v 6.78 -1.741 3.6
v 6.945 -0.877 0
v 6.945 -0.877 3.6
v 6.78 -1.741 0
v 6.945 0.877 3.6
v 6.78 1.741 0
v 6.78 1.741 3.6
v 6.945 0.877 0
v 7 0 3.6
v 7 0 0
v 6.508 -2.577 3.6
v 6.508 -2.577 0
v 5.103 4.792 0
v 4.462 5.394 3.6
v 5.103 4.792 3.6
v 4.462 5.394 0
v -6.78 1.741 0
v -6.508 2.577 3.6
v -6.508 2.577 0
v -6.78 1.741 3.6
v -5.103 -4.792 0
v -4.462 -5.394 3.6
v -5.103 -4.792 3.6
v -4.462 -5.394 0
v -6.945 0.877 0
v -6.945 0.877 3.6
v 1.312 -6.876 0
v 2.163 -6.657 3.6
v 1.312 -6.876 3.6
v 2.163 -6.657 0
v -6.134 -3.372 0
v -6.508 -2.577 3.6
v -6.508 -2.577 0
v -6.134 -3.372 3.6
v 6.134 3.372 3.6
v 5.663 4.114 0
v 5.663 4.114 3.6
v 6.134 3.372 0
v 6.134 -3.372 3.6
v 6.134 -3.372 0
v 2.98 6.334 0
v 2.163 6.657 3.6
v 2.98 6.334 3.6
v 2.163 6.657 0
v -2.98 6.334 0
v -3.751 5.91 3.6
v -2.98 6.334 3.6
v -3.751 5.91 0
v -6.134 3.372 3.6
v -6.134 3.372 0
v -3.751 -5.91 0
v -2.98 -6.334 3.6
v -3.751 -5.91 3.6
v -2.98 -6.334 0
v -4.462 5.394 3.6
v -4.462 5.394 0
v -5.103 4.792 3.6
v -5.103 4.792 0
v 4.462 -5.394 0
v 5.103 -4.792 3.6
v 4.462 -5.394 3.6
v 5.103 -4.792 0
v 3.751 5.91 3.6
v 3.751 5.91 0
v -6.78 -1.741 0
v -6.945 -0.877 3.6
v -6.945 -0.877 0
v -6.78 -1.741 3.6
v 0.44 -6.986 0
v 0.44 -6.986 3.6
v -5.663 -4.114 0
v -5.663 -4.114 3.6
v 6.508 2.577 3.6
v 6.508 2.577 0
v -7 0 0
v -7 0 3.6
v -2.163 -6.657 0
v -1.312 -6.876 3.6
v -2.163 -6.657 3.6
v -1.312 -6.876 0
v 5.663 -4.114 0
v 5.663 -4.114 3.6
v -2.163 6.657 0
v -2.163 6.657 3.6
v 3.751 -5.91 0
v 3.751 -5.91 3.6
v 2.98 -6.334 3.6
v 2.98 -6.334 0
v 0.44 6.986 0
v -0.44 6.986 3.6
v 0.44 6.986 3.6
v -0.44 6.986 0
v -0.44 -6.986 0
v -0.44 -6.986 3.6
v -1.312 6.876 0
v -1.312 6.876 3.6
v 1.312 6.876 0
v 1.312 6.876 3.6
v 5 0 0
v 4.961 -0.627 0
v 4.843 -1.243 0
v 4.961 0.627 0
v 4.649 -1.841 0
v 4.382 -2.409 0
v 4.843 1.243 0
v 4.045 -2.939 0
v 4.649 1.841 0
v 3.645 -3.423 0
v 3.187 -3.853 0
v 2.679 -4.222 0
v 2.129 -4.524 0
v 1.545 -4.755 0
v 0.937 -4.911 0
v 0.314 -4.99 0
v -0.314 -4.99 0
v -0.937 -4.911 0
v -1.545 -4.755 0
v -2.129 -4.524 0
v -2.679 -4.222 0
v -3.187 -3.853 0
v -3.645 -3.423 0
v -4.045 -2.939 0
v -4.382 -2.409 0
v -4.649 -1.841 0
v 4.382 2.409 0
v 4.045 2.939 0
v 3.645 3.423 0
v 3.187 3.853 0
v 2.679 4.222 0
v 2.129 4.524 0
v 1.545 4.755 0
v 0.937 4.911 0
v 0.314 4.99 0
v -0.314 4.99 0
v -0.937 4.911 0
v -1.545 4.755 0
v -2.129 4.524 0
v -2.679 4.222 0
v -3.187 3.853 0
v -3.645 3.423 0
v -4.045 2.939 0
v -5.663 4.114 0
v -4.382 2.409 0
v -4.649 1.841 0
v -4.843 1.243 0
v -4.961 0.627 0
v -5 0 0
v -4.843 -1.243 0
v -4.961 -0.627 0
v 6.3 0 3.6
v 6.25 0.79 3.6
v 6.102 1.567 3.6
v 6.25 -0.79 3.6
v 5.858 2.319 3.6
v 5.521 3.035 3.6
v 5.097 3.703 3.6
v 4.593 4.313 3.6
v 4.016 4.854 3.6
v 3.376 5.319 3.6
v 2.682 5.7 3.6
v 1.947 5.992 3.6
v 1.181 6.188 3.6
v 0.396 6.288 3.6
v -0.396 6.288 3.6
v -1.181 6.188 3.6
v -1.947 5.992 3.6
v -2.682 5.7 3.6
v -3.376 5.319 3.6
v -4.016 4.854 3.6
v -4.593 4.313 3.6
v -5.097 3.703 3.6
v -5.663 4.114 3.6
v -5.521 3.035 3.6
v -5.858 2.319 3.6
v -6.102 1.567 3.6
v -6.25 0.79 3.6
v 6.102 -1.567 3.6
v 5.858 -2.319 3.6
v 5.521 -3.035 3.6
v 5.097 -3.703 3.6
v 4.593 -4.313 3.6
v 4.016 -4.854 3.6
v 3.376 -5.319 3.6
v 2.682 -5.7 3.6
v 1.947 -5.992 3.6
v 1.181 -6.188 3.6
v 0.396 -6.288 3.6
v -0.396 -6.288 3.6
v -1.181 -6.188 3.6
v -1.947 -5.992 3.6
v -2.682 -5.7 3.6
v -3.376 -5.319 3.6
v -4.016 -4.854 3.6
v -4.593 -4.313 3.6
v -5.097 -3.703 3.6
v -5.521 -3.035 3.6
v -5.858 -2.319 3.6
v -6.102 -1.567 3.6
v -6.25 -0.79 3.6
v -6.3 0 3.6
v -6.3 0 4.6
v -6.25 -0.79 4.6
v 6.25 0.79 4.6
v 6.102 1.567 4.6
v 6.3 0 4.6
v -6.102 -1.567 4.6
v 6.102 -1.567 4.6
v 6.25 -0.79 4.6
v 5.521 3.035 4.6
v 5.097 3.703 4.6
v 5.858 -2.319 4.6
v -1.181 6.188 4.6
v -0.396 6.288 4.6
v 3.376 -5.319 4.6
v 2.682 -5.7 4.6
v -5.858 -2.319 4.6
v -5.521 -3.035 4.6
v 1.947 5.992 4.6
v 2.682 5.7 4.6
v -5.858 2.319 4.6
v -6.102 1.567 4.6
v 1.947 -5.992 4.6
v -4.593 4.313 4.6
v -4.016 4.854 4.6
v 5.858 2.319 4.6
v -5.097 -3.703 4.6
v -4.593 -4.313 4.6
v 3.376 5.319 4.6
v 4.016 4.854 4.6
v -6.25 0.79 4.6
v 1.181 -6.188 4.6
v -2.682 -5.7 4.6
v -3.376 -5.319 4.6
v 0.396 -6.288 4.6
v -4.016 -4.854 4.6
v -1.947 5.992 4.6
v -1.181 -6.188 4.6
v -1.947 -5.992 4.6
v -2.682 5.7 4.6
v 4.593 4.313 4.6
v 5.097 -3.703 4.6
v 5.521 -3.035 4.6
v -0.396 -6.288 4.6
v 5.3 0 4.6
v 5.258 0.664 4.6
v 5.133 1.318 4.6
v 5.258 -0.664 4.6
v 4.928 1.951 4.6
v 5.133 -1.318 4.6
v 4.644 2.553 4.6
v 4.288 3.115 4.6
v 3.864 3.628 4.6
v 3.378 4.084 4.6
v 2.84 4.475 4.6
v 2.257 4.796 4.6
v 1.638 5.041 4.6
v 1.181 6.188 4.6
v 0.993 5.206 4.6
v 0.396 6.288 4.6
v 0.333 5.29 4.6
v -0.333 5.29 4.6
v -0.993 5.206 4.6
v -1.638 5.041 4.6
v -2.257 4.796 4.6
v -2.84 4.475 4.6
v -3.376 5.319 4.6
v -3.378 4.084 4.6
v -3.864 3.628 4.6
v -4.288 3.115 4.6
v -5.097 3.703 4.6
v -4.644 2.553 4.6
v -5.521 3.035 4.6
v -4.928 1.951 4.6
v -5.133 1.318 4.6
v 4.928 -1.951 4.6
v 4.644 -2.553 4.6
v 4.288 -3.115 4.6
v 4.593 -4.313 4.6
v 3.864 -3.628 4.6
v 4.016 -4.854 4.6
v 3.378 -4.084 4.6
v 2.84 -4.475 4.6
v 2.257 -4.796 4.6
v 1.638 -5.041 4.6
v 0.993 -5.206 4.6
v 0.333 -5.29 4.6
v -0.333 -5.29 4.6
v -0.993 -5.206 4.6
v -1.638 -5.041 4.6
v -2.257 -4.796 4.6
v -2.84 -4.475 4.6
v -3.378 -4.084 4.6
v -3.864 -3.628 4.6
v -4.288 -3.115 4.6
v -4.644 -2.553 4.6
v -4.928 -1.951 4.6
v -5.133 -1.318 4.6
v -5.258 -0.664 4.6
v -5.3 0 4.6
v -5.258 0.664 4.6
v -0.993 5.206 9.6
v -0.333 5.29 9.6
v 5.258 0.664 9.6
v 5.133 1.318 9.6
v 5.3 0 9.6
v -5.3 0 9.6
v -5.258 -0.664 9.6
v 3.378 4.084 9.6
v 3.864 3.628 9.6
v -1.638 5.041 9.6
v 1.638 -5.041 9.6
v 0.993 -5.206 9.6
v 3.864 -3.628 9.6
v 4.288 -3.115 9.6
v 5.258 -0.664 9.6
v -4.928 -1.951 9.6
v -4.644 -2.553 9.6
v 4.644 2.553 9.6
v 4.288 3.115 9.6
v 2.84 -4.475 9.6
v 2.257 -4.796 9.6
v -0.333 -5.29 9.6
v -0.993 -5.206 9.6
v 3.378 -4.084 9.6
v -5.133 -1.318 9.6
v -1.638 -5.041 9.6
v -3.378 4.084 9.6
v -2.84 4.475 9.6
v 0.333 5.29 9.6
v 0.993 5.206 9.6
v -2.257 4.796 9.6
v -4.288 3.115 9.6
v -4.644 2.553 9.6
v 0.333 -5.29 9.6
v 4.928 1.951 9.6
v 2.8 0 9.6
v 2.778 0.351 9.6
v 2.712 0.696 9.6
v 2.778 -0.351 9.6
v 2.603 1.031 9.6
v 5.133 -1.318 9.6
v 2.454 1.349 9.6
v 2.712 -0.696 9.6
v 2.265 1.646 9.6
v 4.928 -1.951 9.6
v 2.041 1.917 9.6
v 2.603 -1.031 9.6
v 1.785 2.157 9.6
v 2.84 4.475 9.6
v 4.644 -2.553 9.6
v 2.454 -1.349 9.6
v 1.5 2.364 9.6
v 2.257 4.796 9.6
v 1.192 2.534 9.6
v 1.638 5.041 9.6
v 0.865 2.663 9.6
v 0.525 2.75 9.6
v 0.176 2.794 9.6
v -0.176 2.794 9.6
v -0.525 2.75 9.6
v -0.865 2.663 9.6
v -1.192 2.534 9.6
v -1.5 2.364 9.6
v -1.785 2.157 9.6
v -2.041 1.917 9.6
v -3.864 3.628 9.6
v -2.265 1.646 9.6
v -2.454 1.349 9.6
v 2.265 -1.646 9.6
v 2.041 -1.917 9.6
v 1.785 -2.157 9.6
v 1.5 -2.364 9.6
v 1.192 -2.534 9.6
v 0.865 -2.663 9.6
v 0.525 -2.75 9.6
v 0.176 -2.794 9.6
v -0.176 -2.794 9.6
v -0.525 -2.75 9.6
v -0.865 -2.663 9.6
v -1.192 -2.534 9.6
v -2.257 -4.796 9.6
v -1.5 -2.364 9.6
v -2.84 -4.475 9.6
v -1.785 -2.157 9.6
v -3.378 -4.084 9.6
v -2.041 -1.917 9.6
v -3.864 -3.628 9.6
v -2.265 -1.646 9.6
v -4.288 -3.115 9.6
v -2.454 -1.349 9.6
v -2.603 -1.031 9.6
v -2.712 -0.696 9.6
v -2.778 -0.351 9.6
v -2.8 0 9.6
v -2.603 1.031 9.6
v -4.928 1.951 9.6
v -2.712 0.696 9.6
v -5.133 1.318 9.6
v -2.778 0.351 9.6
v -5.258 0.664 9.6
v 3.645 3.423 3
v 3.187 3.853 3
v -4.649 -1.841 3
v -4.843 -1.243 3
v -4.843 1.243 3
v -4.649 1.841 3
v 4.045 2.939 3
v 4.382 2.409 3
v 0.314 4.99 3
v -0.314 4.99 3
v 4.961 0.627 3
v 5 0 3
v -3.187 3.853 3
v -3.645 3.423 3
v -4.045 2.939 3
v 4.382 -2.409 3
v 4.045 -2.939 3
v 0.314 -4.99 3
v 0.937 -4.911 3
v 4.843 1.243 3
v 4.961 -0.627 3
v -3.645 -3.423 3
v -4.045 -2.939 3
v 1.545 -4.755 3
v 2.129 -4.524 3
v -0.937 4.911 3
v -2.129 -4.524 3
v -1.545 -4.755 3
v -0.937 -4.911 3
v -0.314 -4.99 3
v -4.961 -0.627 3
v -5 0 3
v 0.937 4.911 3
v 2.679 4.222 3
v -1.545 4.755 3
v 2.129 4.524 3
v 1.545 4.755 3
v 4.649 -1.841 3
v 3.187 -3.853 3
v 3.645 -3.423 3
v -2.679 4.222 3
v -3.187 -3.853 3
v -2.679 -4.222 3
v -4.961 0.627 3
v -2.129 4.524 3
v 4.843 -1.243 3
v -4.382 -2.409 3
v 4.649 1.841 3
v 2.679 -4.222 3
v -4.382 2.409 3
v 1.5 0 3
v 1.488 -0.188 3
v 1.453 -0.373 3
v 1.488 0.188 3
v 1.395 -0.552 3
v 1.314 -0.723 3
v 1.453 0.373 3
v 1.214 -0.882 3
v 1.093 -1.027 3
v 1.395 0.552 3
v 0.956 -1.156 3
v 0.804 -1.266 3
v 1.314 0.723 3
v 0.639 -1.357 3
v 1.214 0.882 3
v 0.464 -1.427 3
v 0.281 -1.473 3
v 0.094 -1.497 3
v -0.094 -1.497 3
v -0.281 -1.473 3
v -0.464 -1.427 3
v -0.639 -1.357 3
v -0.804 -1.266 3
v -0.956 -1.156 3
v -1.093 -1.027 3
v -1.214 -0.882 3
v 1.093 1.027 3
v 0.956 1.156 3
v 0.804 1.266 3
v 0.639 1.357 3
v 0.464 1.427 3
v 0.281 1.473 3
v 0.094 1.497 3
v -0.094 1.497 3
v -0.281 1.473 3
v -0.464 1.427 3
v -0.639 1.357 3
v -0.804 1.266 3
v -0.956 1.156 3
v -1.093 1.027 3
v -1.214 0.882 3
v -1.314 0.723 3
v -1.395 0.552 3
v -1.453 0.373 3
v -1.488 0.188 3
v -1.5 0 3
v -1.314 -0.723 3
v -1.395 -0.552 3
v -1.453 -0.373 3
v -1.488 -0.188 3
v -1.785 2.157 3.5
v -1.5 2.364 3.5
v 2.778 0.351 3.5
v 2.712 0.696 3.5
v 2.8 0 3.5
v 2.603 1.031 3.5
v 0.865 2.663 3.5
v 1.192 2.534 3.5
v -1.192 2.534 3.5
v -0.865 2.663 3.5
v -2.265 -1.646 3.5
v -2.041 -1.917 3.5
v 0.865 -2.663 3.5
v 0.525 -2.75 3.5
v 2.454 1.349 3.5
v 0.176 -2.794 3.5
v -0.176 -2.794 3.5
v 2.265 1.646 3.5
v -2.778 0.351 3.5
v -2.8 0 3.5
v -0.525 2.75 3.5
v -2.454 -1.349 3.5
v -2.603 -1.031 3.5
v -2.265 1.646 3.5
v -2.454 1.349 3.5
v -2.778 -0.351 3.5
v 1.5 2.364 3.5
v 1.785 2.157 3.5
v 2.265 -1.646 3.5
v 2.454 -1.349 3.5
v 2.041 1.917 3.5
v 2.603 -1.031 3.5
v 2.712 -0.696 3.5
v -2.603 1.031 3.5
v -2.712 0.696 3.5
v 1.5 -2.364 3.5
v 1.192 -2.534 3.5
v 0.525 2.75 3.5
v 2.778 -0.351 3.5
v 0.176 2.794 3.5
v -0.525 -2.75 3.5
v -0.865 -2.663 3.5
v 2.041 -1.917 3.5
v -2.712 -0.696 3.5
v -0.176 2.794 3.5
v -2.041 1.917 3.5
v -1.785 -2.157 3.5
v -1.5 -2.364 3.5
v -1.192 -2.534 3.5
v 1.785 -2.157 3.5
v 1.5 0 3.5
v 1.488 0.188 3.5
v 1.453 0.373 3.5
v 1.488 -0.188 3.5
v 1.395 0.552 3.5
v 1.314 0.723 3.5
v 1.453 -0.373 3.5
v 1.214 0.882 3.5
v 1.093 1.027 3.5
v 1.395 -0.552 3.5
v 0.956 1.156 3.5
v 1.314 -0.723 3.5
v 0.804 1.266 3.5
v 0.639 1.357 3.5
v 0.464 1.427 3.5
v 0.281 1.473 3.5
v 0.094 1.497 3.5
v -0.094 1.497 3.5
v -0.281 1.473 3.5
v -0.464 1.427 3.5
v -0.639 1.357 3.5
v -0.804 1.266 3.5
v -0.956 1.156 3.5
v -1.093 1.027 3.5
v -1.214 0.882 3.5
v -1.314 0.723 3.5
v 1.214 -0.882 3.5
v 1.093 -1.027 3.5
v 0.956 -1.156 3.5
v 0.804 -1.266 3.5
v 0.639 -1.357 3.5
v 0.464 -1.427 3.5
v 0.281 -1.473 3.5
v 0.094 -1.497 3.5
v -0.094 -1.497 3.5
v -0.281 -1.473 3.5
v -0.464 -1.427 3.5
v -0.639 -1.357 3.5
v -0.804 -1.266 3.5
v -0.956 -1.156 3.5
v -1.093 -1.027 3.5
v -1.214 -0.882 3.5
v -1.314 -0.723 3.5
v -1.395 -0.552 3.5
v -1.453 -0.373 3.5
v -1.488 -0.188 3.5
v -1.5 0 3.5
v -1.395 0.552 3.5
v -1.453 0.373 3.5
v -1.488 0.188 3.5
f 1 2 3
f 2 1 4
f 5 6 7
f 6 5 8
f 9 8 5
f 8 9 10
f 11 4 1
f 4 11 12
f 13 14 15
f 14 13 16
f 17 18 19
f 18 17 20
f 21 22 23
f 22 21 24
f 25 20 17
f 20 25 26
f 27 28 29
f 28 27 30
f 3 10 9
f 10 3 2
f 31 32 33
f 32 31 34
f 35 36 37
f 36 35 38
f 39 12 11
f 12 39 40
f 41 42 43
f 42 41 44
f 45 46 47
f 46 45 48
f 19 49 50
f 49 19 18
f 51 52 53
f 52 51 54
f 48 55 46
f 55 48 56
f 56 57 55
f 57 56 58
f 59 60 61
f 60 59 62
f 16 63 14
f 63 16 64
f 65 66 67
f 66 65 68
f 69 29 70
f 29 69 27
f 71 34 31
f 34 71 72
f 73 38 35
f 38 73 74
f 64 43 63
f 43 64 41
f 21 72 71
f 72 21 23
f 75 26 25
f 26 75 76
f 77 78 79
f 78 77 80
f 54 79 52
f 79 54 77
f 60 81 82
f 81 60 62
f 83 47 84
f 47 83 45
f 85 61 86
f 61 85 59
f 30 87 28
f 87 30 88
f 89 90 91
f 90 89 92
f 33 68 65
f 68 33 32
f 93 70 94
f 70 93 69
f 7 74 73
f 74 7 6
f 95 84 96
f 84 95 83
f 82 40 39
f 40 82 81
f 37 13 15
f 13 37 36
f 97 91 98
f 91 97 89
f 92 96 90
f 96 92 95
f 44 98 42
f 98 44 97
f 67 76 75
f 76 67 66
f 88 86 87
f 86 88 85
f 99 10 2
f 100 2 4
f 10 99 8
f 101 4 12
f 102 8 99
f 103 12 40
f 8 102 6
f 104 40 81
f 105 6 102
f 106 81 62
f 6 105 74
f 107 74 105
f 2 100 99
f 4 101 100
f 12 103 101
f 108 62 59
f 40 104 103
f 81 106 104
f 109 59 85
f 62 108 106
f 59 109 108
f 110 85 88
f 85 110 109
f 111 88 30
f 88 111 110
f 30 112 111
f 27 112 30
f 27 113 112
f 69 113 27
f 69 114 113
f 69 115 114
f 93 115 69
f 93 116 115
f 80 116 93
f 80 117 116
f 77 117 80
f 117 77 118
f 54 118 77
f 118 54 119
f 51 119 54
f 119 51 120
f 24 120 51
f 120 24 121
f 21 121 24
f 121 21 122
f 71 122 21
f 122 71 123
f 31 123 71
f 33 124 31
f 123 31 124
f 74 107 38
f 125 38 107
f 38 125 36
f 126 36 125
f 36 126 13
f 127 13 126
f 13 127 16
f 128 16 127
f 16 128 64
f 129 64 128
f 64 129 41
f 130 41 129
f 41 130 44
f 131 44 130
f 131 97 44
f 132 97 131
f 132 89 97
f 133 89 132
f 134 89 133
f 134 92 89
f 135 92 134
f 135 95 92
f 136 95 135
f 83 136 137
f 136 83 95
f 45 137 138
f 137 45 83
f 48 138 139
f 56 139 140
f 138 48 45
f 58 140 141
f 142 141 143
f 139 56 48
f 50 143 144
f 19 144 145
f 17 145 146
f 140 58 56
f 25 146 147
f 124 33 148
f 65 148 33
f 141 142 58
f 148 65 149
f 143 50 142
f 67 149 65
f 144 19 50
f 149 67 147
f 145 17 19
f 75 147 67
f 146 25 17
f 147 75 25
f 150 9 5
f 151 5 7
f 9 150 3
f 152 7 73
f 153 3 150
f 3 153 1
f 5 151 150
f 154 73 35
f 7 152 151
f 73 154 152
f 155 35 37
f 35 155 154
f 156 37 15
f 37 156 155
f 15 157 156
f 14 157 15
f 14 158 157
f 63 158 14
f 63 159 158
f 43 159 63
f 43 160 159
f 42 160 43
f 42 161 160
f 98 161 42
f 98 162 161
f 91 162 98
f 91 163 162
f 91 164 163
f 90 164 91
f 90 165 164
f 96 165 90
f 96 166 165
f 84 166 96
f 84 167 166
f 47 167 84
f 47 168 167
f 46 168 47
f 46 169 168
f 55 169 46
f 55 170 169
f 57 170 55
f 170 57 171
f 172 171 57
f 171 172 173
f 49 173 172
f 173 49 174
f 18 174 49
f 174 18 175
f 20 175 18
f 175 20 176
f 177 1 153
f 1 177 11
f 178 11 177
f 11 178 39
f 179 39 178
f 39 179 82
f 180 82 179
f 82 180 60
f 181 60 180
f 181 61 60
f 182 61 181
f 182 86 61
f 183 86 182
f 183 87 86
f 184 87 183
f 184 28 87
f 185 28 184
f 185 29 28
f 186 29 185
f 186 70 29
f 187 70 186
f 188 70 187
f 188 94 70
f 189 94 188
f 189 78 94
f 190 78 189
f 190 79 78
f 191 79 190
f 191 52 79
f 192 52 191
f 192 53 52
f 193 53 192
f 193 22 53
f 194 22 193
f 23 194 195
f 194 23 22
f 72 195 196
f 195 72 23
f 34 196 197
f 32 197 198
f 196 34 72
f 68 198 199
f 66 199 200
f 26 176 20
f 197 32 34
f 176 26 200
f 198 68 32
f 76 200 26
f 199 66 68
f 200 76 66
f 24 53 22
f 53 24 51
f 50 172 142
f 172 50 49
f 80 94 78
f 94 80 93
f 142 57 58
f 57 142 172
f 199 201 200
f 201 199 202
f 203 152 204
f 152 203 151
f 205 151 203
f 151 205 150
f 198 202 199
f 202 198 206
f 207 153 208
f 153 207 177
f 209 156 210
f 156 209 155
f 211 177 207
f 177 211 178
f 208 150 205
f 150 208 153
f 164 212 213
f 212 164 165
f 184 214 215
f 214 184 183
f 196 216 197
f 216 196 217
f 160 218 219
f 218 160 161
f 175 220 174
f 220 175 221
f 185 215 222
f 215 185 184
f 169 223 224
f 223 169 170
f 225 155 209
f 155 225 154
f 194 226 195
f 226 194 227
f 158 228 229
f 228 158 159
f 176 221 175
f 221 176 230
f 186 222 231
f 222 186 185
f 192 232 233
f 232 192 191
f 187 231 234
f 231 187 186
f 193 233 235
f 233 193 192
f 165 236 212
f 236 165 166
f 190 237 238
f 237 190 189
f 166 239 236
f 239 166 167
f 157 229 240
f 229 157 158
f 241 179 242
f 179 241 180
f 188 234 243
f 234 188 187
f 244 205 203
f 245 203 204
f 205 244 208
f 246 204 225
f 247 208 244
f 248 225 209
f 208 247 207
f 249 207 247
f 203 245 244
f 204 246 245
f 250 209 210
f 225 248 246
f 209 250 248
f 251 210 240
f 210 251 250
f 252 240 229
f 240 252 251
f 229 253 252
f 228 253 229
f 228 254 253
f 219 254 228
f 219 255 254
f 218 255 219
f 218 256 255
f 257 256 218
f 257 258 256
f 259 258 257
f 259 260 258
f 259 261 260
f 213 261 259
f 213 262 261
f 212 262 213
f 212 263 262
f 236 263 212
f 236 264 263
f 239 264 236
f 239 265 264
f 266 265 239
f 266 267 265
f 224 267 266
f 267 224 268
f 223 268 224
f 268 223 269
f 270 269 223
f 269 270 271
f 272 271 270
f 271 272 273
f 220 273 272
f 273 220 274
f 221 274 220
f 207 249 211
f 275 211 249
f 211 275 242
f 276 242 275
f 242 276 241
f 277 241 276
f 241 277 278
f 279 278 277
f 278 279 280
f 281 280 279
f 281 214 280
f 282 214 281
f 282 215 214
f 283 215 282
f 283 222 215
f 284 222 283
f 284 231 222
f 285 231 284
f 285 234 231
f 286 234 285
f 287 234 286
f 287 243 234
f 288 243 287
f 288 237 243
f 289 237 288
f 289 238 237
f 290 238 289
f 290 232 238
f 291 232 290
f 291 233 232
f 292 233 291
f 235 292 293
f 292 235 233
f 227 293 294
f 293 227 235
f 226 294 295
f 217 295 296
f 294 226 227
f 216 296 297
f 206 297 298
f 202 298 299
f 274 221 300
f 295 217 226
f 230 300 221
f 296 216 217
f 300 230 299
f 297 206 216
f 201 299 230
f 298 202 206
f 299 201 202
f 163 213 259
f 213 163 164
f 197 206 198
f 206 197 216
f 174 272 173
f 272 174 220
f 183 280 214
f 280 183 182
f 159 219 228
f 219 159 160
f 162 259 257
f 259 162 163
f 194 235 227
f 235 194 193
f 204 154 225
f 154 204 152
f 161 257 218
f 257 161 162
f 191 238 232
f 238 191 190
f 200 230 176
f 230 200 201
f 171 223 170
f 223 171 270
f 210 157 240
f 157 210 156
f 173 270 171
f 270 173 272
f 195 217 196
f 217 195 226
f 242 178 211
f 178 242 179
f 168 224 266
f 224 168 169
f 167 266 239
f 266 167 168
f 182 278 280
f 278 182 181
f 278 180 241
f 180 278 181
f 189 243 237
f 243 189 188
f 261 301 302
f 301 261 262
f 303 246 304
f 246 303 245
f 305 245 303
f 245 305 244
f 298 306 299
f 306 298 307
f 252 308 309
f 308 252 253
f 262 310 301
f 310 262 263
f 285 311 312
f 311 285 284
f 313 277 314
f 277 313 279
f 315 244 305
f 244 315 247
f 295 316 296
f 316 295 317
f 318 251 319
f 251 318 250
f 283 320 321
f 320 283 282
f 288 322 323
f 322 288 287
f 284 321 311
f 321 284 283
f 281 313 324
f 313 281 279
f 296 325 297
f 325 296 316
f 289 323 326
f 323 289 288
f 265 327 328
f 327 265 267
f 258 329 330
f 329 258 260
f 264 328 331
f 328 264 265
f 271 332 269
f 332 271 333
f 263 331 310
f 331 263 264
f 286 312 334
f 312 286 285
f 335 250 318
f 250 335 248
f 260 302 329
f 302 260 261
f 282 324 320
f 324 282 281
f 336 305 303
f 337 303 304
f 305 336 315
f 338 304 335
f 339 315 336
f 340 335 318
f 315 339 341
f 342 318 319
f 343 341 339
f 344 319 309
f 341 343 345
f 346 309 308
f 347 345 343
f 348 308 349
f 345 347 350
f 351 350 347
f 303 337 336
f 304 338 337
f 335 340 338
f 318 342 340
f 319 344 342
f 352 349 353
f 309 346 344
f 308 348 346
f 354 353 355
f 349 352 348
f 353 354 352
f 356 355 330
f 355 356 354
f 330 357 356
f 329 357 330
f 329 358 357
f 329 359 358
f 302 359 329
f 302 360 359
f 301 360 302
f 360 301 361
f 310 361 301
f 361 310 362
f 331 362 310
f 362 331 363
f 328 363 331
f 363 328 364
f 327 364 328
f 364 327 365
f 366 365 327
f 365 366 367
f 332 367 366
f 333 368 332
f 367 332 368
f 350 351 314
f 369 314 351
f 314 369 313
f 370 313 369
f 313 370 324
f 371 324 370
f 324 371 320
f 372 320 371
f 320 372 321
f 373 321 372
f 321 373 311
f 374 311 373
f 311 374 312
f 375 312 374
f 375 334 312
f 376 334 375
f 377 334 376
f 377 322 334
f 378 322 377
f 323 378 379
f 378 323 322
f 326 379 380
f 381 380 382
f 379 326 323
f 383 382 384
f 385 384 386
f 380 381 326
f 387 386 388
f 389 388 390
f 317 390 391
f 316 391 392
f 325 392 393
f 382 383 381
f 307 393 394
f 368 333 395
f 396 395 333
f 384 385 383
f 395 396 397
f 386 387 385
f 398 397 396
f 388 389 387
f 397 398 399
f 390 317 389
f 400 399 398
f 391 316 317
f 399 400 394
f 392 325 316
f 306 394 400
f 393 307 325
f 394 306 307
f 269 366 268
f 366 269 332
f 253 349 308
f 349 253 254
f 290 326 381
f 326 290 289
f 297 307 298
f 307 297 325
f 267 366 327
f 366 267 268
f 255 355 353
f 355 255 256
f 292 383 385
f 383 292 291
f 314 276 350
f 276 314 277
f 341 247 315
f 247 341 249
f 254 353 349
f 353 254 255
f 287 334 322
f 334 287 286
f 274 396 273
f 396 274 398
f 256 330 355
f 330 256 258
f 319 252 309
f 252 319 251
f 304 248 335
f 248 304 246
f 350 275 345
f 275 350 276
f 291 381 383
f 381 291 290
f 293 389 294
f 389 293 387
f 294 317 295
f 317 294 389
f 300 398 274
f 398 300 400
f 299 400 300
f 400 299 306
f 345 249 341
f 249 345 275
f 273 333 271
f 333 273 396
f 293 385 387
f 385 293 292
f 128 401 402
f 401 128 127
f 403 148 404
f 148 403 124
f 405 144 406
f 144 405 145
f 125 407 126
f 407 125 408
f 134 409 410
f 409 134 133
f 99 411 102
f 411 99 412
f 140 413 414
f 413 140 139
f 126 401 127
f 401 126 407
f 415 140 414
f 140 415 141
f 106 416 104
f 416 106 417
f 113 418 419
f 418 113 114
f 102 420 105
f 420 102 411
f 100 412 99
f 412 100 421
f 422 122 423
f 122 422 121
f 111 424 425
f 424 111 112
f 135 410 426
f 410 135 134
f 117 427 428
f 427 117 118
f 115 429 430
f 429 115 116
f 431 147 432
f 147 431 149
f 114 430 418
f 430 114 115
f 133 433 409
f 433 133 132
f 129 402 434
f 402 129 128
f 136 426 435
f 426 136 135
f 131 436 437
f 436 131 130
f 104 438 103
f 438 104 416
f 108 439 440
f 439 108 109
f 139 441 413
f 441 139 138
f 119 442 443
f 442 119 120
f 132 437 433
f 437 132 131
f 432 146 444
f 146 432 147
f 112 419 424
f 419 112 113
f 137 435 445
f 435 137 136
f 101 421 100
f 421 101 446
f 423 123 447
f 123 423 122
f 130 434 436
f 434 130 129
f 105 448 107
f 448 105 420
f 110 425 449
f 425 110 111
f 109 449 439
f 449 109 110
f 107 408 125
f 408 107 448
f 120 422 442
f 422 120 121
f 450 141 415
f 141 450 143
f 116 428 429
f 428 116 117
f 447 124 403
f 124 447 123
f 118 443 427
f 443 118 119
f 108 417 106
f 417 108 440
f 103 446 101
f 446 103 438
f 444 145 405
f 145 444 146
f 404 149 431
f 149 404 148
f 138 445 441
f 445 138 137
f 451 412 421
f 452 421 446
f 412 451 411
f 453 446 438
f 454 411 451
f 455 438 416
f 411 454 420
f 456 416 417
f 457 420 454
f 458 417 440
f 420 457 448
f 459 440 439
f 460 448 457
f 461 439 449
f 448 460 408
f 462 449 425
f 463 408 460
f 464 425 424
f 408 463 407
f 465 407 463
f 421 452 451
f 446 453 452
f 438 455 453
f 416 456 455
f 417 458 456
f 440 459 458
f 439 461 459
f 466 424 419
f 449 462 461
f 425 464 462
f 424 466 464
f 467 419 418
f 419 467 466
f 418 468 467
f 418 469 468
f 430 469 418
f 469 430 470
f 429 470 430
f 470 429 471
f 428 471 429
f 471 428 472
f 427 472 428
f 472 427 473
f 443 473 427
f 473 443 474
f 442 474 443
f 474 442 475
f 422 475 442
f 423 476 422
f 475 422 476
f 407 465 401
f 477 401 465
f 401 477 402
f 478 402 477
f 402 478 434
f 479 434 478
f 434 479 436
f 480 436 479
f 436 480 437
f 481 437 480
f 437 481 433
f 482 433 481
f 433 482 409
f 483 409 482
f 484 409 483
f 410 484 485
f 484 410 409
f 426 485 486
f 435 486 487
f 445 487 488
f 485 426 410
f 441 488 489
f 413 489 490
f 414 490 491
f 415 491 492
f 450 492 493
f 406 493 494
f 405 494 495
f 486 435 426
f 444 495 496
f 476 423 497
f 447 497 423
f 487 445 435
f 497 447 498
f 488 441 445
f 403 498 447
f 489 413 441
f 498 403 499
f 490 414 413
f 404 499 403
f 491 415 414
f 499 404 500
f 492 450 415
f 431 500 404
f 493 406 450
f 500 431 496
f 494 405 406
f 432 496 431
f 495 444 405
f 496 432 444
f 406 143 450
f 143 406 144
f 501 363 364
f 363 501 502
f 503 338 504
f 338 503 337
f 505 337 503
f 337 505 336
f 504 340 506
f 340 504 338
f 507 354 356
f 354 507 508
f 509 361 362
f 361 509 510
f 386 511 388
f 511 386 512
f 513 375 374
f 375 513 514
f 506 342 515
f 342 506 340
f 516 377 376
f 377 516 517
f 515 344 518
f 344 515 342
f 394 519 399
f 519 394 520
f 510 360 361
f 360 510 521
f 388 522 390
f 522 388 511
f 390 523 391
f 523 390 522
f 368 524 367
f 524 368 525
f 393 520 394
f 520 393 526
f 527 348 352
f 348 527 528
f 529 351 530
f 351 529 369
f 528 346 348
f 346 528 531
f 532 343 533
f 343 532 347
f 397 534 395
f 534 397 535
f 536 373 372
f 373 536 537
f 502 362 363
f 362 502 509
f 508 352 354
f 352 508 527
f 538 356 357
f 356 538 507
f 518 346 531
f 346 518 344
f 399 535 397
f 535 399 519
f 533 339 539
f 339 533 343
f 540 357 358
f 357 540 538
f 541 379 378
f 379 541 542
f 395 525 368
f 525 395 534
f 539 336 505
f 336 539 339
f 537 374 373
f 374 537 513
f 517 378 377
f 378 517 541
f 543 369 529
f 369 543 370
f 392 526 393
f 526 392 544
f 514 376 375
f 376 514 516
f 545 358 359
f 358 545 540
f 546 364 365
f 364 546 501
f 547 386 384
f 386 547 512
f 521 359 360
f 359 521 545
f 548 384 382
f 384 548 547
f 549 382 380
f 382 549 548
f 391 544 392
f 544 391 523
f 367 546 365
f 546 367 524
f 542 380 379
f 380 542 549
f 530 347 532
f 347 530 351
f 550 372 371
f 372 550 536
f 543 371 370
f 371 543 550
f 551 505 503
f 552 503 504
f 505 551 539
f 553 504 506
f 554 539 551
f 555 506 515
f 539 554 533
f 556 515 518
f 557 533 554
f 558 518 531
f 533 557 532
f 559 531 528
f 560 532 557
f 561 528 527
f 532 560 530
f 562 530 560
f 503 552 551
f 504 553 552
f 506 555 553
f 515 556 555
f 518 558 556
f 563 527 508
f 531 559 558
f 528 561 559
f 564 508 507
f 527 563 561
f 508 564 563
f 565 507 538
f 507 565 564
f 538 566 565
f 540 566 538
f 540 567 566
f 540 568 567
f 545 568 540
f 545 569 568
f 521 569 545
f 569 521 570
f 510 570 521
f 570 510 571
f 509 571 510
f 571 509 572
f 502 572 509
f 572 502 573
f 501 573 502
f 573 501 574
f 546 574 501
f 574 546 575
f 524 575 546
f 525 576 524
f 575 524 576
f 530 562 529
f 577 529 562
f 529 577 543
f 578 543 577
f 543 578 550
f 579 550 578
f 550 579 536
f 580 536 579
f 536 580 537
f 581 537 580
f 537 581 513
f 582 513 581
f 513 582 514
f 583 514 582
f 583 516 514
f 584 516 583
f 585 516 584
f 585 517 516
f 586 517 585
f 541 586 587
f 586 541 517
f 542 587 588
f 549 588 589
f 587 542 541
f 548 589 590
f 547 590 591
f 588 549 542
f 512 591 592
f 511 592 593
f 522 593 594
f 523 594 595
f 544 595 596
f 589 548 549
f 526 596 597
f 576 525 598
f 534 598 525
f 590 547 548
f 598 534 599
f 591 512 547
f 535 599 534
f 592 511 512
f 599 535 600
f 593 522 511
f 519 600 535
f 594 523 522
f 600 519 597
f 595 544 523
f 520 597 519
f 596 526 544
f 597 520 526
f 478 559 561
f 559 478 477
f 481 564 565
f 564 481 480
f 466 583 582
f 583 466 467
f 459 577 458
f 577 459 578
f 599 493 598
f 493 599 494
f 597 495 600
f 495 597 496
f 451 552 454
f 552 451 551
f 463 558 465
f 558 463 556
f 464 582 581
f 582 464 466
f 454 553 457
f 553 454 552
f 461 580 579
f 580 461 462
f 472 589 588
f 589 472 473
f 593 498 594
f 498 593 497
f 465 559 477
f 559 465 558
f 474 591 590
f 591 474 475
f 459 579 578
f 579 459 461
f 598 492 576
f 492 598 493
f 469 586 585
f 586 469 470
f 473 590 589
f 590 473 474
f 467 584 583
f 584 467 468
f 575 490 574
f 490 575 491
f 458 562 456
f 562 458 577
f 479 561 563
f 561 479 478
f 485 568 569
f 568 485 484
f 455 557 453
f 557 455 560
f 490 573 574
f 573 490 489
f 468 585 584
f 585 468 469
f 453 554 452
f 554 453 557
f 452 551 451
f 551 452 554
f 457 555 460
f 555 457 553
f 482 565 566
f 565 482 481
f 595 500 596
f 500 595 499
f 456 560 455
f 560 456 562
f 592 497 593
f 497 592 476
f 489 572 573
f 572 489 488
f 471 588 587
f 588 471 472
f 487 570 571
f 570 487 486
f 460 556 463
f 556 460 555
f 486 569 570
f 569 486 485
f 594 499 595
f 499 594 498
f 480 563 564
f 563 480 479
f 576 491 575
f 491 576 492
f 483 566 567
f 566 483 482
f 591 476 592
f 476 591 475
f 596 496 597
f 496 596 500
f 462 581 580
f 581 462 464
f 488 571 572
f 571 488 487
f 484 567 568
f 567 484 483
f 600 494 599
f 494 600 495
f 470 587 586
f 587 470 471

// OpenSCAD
// magnet 10x3 holder on 6mm axis with thread

$fn=50;
ov = 0.1; // overshot for clear view

r_mag    = 5.0;
h_mag    = 3.0;
r_axis   = 2.8; // 5.6 = 6.0 - thread
h_axis   = 6.0;
h_mid    = 0.6;
r_out = max(r_mag,r_axis) + 2.0;
h_all = h_mag + h_mid + h_axis;

difference() {
  union() {
    cylinder( h=h_mag+h_mid, r=r_out );
    translate([0,0,h_mag+h_mid]) cylinder( h=1.0, r=r_axis+3.5 );
    translate([0,0,h_mag+h_mid]) cylinder( h=h_axis, r=r_axis+2.5 );
  }
  translate([0,0,-ov]) cylinder( h=h_mag+ov, r=r_mag );
  translate([0,0,h_mag+h_mid-ov]) cylinder( h=h_axis+2*ov, r=r_axis );
  translate([0,0,-ov]) cylinder( h=h_all+2-ov, r=1.5 );
}
